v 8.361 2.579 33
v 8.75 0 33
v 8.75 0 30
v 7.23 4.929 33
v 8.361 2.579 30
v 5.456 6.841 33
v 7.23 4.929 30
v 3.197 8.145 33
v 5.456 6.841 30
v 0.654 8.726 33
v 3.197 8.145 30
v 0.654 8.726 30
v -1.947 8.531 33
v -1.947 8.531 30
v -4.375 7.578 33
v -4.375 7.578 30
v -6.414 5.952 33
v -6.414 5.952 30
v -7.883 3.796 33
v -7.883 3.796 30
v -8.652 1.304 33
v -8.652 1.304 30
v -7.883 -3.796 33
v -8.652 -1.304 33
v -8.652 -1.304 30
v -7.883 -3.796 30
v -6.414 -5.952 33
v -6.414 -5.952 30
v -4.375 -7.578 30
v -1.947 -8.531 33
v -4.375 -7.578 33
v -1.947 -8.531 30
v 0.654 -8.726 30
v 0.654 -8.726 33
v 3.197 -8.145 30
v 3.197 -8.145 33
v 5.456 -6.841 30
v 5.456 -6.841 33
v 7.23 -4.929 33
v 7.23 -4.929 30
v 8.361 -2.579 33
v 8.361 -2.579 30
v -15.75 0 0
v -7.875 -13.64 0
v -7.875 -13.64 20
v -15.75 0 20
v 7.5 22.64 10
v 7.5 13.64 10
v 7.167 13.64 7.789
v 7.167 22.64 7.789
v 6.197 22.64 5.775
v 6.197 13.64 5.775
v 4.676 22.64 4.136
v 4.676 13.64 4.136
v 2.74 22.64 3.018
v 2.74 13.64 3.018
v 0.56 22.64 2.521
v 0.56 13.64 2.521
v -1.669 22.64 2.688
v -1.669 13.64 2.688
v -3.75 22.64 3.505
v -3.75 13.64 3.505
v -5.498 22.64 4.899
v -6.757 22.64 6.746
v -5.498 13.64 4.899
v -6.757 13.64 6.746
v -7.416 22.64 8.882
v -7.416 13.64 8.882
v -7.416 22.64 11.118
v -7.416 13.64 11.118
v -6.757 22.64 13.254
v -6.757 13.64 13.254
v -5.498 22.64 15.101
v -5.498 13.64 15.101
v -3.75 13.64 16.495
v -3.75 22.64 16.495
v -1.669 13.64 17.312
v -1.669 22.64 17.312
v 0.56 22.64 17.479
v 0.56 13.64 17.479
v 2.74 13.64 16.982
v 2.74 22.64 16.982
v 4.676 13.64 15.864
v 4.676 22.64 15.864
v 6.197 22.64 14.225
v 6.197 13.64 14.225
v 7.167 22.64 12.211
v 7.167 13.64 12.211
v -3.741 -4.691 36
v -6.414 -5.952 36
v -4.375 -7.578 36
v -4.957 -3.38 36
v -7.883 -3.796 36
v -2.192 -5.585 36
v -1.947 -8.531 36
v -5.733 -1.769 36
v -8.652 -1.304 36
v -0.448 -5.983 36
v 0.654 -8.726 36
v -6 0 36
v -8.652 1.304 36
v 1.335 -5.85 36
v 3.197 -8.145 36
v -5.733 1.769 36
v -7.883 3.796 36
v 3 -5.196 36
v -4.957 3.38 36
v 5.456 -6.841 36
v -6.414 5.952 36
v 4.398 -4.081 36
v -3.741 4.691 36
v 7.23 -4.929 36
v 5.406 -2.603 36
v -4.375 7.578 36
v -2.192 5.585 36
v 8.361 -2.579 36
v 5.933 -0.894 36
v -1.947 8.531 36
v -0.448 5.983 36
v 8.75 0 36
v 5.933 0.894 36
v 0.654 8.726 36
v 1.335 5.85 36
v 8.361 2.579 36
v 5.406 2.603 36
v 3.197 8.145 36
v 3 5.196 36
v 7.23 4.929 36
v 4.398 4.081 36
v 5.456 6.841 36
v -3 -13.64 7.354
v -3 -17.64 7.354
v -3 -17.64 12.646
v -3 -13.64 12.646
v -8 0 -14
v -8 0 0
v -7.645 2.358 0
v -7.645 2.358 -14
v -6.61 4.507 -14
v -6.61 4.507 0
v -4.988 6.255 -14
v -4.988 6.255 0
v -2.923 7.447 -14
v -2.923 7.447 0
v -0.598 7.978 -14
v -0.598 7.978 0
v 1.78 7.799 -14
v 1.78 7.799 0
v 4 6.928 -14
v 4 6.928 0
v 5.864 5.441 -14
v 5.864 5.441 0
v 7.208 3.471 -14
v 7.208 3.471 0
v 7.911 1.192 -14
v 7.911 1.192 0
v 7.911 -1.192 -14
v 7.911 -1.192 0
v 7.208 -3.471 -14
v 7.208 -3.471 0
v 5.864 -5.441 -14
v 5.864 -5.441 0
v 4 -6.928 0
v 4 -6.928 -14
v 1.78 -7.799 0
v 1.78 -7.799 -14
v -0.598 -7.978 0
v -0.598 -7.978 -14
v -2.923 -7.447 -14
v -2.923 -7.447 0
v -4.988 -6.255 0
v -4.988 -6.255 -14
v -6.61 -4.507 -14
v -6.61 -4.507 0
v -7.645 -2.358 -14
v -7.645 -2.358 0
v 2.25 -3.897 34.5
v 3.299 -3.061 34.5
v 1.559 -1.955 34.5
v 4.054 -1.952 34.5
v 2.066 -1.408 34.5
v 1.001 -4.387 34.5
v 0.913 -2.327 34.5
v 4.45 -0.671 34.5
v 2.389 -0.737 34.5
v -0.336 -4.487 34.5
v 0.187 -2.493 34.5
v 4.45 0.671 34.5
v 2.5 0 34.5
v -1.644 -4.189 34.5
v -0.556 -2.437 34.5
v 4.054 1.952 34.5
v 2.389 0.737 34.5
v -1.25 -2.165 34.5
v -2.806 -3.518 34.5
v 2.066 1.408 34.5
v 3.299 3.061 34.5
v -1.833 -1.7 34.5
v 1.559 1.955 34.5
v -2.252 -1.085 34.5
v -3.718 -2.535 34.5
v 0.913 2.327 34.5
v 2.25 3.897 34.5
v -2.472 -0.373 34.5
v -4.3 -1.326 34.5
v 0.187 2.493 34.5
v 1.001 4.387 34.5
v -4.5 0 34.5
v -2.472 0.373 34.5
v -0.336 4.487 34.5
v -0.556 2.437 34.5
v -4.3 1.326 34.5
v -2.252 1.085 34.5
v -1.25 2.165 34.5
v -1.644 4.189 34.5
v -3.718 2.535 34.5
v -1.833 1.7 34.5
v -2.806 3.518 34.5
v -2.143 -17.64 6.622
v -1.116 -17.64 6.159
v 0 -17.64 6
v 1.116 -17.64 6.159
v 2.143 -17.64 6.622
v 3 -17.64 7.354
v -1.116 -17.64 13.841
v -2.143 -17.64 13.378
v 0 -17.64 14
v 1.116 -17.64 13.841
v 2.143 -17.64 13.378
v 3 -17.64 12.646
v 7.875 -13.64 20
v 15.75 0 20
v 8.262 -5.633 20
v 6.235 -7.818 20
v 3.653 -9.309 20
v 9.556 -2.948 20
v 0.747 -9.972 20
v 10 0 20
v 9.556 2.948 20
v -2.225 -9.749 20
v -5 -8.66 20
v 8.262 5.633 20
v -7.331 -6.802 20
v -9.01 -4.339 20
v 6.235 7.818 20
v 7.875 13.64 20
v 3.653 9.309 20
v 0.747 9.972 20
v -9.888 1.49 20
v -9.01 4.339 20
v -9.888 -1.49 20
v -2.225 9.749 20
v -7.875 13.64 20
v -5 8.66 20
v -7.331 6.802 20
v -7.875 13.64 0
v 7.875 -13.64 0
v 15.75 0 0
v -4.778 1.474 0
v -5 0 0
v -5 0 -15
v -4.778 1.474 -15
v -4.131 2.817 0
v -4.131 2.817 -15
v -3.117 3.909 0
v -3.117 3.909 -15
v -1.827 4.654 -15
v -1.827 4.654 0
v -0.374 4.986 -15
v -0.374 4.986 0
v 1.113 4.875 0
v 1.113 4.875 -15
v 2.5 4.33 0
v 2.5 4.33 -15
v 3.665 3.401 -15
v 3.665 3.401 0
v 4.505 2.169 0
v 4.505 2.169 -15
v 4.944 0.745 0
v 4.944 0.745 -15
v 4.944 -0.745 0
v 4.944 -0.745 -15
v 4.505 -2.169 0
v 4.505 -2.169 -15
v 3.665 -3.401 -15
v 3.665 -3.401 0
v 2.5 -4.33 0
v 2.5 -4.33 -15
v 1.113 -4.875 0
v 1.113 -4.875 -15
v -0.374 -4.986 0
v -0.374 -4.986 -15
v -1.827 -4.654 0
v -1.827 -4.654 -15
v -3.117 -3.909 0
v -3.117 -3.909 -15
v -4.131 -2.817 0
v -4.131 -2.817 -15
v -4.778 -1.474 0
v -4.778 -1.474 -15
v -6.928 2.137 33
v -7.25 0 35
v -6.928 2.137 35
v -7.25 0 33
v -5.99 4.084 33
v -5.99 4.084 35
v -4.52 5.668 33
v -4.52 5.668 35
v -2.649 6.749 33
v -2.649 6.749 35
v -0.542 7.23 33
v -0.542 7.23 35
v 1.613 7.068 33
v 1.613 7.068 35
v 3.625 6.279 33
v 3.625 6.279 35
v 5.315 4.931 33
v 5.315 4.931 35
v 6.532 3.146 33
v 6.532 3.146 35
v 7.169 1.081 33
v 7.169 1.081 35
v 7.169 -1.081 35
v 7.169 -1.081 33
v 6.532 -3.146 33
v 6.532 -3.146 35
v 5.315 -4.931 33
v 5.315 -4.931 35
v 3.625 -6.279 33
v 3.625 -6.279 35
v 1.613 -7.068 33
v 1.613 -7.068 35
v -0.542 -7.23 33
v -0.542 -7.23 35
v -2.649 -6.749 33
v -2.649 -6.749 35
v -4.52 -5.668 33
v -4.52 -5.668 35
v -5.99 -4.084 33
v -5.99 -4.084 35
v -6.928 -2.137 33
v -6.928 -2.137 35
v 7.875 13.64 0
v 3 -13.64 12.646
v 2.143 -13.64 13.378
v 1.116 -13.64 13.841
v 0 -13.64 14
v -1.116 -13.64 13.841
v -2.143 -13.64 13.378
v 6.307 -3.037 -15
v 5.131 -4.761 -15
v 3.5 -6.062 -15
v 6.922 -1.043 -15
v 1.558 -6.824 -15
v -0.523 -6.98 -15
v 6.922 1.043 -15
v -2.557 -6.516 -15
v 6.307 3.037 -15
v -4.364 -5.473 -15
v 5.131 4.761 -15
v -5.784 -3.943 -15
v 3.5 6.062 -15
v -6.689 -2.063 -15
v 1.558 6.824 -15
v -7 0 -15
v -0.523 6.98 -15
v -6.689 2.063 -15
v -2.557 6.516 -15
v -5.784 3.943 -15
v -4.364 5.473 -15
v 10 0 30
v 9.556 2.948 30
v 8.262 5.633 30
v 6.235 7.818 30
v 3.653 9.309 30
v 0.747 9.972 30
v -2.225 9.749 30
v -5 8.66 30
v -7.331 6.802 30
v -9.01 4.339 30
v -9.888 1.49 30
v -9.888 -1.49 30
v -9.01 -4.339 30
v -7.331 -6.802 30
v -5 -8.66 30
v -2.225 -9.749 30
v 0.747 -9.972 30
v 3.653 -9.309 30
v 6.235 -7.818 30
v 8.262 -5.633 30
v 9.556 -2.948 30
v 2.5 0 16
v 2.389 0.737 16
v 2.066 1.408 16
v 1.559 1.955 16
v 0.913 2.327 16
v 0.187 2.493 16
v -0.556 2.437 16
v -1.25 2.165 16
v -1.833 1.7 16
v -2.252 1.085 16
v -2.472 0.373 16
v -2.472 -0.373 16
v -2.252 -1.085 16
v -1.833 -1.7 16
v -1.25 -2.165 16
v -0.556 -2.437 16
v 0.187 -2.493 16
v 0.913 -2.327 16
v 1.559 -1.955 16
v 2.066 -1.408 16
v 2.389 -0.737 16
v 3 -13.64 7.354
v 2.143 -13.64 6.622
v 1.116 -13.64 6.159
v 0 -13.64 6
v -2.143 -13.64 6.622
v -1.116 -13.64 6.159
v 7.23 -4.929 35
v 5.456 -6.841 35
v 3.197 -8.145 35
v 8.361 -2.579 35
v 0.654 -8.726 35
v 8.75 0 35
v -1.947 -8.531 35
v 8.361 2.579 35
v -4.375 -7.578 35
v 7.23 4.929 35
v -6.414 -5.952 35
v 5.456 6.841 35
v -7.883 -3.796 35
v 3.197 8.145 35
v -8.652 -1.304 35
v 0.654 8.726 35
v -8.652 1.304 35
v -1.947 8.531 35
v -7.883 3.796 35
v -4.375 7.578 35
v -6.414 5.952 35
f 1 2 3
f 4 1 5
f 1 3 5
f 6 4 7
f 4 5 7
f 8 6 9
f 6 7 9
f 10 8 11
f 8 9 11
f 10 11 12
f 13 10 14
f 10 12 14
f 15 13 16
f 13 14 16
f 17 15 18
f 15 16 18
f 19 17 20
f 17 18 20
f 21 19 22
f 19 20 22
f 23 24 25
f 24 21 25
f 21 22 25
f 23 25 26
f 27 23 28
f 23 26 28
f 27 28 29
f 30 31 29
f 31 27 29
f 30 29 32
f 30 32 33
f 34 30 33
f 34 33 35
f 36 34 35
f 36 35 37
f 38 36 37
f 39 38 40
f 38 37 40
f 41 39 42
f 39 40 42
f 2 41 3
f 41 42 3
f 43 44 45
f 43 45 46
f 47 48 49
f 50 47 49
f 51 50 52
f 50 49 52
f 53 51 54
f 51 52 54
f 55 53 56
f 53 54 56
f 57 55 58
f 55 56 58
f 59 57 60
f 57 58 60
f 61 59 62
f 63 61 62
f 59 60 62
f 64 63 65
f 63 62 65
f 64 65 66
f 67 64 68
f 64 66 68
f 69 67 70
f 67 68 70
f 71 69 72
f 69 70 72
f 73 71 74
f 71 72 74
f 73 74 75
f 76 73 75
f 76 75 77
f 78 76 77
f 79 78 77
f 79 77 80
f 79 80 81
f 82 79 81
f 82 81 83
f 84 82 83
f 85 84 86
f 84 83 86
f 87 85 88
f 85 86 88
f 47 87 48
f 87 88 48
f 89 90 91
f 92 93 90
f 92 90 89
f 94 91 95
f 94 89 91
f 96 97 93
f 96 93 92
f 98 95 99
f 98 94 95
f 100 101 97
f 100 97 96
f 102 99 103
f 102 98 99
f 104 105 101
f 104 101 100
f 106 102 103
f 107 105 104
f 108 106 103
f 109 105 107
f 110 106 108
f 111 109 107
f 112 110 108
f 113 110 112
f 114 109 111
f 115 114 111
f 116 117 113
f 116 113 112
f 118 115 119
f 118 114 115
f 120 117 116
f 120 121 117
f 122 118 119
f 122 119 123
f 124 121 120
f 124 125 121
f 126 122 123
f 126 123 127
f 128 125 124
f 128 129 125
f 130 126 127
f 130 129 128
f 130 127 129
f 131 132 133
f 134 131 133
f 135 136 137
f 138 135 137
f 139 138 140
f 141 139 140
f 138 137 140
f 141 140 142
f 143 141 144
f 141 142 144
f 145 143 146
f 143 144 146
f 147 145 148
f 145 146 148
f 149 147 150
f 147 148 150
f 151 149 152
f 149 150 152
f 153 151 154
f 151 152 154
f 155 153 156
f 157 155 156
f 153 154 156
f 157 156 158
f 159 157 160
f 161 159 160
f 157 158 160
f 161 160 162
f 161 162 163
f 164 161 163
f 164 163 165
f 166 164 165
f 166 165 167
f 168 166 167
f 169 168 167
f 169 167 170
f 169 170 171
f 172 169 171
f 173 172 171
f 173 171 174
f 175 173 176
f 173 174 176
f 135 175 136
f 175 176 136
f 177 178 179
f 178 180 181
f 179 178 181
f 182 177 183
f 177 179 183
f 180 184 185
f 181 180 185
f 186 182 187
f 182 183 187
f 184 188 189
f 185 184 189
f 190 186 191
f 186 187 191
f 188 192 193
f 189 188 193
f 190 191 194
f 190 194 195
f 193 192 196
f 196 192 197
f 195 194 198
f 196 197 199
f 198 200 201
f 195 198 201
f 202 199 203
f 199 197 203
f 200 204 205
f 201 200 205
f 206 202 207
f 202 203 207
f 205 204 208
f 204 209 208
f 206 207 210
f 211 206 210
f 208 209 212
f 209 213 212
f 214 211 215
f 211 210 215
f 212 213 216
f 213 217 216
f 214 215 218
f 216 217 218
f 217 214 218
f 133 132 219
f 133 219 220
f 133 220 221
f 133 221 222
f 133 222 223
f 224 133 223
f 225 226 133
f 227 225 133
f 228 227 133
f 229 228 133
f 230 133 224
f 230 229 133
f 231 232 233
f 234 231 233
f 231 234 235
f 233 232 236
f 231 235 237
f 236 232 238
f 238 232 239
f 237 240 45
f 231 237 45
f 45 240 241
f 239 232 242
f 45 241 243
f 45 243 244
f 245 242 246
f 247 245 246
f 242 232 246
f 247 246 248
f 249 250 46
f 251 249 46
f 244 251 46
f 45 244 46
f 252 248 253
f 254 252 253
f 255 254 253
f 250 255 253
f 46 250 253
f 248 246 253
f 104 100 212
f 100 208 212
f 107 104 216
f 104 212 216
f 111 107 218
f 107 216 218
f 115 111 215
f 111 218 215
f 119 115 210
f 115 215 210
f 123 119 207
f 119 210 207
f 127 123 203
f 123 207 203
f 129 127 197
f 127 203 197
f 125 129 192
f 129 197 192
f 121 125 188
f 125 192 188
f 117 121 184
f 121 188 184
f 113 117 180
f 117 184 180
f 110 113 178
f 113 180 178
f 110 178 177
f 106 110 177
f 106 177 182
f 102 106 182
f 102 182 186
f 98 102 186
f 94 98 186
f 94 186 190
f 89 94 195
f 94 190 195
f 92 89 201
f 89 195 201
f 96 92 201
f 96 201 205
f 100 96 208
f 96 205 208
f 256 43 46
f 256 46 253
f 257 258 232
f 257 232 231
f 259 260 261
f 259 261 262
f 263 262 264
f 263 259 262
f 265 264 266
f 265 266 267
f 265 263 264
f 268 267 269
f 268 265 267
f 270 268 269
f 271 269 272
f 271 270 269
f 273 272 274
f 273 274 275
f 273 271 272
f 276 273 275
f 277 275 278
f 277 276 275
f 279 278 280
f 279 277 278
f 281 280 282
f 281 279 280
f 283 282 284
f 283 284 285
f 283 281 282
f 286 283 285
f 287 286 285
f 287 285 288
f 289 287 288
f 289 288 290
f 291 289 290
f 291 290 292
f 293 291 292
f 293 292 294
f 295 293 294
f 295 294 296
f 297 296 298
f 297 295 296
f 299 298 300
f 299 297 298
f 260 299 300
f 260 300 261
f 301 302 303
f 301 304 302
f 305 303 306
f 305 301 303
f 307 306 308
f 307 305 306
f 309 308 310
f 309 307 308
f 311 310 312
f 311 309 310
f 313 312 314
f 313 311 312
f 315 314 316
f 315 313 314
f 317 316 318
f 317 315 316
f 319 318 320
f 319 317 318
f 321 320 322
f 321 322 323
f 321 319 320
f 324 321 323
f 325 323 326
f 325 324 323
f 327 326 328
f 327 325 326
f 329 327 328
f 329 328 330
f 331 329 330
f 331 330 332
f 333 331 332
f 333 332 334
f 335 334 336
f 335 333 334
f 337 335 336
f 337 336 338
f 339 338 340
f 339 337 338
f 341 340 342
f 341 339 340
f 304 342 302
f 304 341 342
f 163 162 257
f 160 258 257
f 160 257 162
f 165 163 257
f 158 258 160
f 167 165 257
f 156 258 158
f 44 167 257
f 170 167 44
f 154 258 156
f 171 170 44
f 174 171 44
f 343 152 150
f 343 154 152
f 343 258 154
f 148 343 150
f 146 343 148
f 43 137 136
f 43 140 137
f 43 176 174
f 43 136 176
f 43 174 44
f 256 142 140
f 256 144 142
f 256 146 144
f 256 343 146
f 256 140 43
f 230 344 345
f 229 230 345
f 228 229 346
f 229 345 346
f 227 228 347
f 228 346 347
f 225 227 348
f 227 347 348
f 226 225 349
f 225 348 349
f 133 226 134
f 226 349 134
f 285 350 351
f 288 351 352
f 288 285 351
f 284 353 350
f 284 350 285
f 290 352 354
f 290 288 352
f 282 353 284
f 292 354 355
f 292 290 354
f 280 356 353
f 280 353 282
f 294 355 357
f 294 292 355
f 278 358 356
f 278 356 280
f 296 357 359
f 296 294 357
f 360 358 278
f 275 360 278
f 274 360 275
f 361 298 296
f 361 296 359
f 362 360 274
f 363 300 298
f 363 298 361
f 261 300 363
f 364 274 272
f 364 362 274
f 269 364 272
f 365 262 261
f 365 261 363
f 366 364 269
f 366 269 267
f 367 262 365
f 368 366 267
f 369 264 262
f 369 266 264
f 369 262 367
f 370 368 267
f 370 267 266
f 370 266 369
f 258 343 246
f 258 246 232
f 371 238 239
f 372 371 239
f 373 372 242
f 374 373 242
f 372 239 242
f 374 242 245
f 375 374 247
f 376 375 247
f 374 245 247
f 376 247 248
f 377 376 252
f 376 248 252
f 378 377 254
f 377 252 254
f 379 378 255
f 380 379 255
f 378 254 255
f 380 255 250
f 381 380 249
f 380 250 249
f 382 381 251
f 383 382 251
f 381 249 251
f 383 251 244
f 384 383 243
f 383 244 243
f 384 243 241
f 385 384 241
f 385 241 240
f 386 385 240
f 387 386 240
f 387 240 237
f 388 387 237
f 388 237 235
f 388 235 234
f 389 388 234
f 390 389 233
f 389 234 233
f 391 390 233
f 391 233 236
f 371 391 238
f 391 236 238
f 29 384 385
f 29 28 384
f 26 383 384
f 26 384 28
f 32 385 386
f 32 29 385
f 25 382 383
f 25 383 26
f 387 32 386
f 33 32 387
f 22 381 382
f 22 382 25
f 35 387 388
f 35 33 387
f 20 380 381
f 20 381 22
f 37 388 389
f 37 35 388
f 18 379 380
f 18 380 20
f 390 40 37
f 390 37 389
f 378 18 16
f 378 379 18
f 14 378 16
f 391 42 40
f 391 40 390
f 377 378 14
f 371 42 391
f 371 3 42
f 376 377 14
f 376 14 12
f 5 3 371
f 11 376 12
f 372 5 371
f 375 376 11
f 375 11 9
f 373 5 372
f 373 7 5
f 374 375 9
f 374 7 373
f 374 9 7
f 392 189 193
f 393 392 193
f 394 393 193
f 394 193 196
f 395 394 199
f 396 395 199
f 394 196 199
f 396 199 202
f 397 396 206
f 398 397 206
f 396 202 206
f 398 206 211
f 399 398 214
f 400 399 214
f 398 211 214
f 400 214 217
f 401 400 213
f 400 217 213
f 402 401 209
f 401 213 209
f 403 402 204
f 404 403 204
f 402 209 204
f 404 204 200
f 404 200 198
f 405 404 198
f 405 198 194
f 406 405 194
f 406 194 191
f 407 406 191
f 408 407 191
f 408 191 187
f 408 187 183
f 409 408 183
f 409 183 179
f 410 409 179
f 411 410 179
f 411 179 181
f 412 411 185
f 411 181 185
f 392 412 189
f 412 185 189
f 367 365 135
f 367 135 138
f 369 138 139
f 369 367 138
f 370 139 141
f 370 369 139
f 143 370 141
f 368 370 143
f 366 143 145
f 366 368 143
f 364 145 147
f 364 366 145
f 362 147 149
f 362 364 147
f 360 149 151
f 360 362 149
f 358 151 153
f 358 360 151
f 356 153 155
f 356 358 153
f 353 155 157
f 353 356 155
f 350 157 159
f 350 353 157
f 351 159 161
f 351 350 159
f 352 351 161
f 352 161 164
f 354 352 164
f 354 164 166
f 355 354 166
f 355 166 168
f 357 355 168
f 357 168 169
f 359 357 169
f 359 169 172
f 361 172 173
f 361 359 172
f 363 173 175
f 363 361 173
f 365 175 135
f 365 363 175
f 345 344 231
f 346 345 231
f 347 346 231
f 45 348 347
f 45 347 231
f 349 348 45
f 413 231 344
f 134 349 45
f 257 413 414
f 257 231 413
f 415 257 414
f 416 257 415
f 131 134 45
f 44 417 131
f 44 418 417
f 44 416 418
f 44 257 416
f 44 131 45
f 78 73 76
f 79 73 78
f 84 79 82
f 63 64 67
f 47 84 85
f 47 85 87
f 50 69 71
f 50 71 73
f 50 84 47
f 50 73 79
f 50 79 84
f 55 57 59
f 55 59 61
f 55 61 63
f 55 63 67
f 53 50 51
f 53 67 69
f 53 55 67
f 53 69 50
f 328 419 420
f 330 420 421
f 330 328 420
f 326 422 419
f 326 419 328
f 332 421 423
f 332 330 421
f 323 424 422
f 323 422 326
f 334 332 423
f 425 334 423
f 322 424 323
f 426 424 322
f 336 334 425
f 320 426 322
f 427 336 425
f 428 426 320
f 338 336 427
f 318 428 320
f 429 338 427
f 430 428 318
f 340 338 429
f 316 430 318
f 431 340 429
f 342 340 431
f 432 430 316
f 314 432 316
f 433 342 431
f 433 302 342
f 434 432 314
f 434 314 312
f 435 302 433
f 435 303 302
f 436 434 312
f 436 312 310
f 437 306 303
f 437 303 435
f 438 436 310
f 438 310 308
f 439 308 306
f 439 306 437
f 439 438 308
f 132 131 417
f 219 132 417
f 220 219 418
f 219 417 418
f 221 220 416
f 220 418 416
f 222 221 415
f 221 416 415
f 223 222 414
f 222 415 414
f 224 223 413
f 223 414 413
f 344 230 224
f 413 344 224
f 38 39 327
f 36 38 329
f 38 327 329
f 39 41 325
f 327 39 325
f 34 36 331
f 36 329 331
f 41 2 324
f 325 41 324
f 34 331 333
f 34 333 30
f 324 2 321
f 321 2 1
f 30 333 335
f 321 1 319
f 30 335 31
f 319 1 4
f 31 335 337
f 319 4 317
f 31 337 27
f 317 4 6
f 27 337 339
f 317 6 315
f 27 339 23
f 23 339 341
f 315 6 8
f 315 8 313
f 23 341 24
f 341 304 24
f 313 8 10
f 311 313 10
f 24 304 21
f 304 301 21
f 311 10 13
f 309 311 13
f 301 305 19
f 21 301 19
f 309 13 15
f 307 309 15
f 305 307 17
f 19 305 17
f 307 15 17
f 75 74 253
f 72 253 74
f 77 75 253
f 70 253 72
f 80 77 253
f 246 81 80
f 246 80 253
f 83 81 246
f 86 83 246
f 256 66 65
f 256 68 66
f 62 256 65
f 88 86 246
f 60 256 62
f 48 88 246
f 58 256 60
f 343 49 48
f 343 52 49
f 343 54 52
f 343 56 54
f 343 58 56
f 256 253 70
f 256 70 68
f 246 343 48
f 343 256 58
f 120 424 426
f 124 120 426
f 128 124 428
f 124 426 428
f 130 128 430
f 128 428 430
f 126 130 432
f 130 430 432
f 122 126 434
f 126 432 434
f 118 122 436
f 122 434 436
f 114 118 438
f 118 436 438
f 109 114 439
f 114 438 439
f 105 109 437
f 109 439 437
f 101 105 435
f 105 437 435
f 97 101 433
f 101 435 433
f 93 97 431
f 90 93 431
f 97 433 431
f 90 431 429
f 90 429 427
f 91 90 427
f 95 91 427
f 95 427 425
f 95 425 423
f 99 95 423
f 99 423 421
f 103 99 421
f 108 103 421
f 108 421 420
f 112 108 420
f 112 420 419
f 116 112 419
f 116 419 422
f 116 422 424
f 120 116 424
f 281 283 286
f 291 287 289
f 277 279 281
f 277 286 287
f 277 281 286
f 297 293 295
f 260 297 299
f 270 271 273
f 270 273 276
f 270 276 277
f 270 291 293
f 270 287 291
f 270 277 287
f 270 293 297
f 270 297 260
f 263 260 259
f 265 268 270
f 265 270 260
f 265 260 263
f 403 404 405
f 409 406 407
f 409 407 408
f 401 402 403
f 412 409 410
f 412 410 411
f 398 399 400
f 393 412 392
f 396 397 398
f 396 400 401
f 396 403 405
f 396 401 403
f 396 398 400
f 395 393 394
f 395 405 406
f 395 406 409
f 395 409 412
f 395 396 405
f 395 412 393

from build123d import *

# Parameters (mm, degrees)
BOSS_EXTRUDE1_DEPTH = 20
SKETCH2_R           = 10
BOSS_EXTRUDE2_DEPTH = 10
SKETCH3_R           = 8.75
BOSS_EXTRUDE3_DEPTH = 6
SKETCH5_R           = 2.5
CUT_EXTRUDE1_DEPTH  = 18.5
SKETCH6_W           = 1.5
SKETCH6_H           = 2
SKETCH7_R           = 4
BOSS_EXTRUDE4_DEPTH = 4
CUT_EXTRUDE2_DEPTH  = 4
SKETCH9_R           = 7.5
BOSS_EXTRUDE5_DEPTH = 9
SKETCH10_R          = 8
SKETCH10_R_2        = 5
BOSS_EXTRUDE6_DEPTH = 15
CHAMFER1_SIZE       = 1


with BuildPart() as part:
    # Sketch1 → Boss-Extrude1 (new body)
    with BuildSketch(Plane.XY):
        Polygon((-7.875, 13.63990011), (7.875, 13.63990011), (15.75, 0), (7.875, -13.63990011), (-7.875, -13.63990011), (-15.75, 0), align=None)
    extrude(amount=BOSS_EXTRUDE1_DEPTH)

    # Sketch2 → Boss-Extrude2 (add)
    with BuildSketch(Plane.XY.offset(20)):
        Circle(SKETCH2_R)
    extrude(amount=BOSS_EXTRUDE2_DEPTH)

    # Sketch3 → Boss-Extrude3 (add)
    with BuildSketch(Plane.XY.offset(30)):
        Circle(SKETCH3_R)
    extrude(amount=BOSS_EXTRUDE3_DEPTH)

    # Sketch4 → Cut-Revolve1 (revolve, cut)
    with BuildSketch(Plane(origin=(0, 0, 0), x_dir=(1, 0, 0), z_dir=(0, 1, 0))):
        Polygon((0, -36), (-6, -36), (-4.5, -34.5), (0, -34.5), align=None)
    revolve(axis=Axis((0, 0, 45.254539395), (0, 0, -1)), mode=Mode.SUBTRACT)

    # Sketch5 → Cut-Extrude1 (cut)
    with BuildSketch(Plane.XY.offset(34.5)):
        Circle(SKETCH5_R)
    extrude(amount=-CUT_EXTRUDE1_DEPTH, mode=Mode.SUBTRACT)

    # Sketch6 → Cut-Revolve2 (revolve, cut)
    with BuildSketch(Plane(origin=(0, 0, 0), x_dir=(1, 0, 0), z_dir=(0, 1, 0))):
        with Locations((-8, -34)):
            Rectangle(SKETCH6_W, SKETCH6_H)
    revolve(axis=Axis((0, 0, 40.657268224), (0, 0, -1)), mode=Mode.SUBTRACT)

    # Sketch7 → Boss-Extrude4 (add)
    with BuildSketch(Plane.XZ.offset(13.63990011)):
        with Locations((0, 10)):
            Circle(SKETCH7_R)
    extrude(amount=BOSS_EXTRUDE4_DEPTH)

    # Sketch8 → Cut-Extrude2 (cut)
    with BuildSketch(Plane.XZ.offset(17.63990011)):
        with BuildLine():
            ThreePointArc((-3, 12.645751311), (-4, 10), (-3, 7.354248689))
            Line((-3, 7.354248689), (-3, 12.645751311))
        make_face()
        with BuildLine():
            Line((3, 12.645751311), (3, 7.354248689))
            ThreePointArc((3, 7.354248689), (3.741657387, 8.585786438), (4, 10))
            ThreePointArc((4, 10), (3.741657387, 11.414213562), (3, 12.645751311))
        make_face()
    extrude(amount=-CUT_EXTRUDE2_DEPTH, mode=Mode.SUBTRACT)

    # Sketch9 → Boss-Extrude5 (add)
    with BuildSketch(Plane(origin=(0, 13.63990011, 0), x_dir=(1, 0, 0), z_dir=(0, 1, 0))):
        with Locations((0, -10)):
            Circle(SKETCH9_R)
    extrude(amount=BOSS_EXTRUDE5_DEPTH)

    # Sketch10 → Boss-Extrude6 (add)
    with BuildSketch(Plane(origin=(0, 0, 0), x_dir=(-1, 0, 0), z_dir=(0, 0, -1))):
        Circle(SKETCH10_R)
        Circle(SKETCH10_R_2, mode=Mode.SUBTRACT)
    extrude(amount=BOSS_EXTRUDE6_DEPTH)

    # Chamfer1
    chamfer1_edges = [part.edges().sort_by_distance(p)[0] for p in [
        (8, 0, -15),
    ]]
    chamfer(chamfer1_edges, length=CHAMFER1_SIZE)


solid = part.part
